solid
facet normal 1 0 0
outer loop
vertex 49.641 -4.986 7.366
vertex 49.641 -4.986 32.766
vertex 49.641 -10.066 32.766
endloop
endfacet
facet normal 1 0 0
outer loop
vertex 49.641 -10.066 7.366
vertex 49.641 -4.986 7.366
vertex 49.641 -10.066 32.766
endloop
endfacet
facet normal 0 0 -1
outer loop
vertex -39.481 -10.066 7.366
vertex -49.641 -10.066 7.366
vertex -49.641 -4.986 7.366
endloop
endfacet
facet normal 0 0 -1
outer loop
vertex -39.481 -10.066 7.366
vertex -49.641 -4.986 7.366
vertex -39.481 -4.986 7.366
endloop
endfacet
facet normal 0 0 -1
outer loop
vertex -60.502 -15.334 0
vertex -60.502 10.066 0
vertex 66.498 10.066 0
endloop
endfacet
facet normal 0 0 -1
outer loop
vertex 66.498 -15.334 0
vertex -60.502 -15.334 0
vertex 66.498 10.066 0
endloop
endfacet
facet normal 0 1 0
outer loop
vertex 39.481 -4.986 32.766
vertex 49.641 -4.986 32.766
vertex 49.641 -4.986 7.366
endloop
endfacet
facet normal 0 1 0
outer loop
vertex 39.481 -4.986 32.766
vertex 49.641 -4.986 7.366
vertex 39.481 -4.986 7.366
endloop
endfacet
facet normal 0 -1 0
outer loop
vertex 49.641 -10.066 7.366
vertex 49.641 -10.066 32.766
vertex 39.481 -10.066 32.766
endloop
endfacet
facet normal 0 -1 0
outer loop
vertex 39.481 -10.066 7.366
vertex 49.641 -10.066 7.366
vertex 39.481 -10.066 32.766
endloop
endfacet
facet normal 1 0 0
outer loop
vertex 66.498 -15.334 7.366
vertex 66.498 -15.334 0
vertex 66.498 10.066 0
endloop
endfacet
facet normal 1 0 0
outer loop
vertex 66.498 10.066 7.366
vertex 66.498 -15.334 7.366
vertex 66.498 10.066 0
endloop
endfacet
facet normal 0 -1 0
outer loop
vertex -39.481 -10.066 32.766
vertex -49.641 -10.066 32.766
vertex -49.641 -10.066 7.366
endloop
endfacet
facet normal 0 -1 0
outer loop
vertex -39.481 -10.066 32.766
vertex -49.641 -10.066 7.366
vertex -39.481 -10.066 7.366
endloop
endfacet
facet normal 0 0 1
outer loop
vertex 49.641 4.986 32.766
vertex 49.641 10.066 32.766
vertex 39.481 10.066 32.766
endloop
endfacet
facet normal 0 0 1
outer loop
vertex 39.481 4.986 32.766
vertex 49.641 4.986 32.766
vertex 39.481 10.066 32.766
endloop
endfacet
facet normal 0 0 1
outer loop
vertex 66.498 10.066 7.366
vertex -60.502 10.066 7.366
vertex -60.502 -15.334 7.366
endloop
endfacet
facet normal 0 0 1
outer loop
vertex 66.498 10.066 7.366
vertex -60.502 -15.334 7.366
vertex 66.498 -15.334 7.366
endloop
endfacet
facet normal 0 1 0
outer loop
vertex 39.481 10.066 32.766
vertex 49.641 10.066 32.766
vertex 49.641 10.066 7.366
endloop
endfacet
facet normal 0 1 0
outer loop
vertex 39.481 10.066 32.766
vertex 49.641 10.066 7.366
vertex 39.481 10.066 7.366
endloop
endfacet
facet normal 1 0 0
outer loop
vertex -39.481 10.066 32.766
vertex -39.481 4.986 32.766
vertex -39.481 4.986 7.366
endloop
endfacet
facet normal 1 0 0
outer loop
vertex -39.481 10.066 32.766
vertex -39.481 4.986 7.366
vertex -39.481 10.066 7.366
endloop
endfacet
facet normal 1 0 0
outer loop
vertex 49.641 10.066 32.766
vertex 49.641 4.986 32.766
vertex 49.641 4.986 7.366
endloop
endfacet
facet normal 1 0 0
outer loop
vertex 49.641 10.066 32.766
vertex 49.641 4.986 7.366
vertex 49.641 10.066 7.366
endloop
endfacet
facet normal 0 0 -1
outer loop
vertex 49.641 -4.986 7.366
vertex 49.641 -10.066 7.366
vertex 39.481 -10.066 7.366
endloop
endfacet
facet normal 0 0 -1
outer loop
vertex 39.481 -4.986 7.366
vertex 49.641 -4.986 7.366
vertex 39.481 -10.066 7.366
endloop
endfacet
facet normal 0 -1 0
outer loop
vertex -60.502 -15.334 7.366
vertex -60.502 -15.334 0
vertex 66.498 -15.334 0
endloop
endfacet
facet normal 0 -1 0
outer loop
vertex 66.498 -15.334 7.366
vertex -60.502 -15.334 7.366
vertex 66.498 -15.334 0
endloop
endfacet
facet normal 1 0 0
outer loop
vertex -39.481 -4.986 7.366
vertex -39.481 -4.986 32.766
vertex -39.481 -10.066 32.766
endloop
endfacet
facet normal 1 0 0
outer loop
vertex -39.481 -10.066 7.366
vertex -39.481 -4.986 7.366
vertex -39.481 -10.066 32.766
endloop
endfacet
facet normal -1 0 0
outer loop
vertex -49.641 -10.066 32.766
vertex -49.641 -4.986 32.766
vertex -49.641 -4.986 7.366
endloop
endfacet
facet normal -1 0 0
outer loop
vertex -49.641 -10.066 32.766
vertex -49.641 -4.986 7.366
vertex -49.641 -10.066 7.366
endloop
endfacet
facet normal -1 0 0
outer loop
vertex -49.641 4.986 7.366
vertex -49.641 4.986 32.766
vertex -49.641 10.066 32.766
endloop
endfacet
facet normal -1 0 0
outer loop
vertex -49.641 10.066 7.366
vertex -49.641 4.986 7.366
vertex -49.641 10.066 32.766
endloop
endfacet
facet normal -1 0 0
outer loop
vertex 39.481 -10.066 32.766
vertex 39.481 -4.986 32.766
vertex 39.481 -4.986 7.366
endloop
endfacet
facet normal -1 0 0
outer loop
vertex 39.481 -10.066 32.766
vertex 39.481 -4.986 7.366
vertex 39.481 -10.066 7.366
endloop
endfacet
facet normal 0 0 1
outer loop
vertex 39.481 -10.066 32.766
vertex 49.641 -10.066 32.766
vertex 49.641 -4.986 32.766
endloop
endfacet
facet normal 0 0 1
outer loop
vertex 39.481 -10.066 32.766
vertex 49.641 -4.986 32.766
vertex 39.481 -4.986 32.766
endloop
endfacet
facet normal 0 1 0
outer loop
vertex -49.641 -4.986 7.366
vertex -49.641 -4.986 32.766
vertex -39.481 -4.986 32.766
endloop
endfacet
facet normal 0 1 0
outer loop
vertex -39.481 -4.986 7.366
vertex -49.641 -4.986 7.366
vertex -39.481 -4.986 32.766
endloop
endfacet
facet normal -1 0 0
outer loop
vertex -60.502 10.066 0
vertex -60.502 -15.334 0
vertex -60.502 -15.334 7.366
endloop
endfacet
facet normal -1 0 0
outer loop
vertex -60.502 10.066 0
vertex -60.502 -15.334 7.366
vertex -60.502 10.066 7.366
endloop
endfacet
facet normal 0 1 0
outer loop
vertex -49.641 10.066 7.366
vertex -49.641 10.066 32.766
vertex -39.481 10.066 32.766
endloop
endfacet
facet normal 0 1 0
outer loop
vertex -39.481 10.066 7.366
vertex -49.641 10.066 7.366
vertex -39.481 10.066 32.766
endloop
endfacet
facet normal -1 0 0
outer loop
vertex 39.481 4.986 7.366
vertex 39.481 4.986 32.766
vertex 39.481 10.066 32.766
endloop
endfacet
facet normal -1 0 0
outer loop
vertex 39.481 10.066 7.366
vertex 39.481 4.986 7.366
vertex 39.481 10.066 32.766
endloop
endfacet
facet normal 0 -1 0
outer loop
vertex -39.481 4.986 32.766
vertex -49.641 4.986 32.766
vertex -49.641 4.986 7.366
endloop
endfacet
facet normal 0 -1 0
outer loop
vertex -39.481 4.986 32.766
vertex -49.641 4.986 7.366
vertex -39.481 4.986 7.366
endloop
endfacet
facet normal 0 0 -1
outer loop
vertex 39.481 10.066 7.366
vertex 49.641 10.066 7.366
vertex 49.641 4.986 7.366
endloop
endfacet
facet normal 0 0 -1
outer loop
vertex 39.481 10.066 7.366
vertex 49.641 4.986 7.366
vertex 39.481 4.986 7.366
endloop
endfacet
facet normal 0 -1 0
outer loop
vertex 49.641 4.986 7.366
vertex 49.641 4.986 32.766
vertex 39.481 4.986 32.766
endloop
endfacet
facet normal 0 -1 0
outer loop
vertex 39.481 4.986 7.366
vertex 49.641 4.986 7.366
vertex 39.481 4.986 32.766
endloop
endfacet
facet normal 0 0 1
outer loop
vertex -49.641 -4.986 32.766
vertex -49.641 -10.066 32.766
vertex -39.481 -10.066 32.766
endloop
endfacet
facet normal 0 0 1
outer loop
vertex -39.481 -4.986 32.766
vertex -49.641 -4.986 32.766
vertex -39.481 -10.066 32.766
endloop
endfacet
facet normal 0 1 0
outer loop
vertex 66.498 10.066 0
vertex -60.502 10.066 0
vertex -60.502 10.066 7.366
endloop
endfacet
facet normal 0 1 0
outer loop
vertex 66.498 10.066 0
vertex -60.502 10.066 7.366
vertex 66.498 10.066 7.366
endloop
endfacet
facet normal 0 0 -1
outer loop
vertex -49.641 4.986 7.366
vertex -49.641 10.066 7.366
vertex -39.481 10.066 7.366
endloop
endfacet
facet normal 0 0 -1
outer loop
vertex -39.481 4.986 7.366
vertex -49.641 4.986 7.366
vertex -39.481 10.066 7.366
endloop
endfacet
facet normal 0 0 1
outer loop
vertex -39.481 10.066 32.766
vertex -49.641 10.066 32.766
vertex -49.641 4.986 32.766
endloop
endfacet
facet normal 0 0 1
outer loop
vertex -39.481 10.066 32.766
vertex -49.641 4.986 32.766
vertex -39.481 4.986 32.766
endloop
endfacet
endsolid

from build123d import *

# Parameters (mm, degrees)
F0_W     = 127
F0_H     = 25.4
F1_DEPTH = 7.366
F2_W     = 10.16
F2_H     = 5.08
F3_DEPTH = 25.4


with BuildPart() as f1:
    # F0 (on Top) → F1 (new body)
    with BuildSketch(Plane.XY):
        with Locations((2.998403, -2.634404)):
            Rectangle(F0_W, F0_H)
    extrude(amount=F1_DEPTH)


with BuildPart() as f3:
    # F2 (on face) → F3 (new body)
    with BuildSketch(Plane.XY.offset(7.366)):
        with Locations((-44.560708, 7.525596)):
            Rectangle(F2_W, F2_H)
    extrude(amount=F3_DEPTH)


with BuildPart() as f4_1:
    # F4: instance of F3
    add(f3.part.mirror(Plane.YZ))


with BuildPart() as f5_1:
    # F5: instance of F3
    add(f3.part.mirror(Plane.XZ))


with BuildPart() as f5_2:
    # F5: instance of F4_1
    add(f4_1.part.mirror(Plane.XZ))


solid = Compound([f1.part, f3.part, f4_1.part, f5_1.part, f5_2.part])
